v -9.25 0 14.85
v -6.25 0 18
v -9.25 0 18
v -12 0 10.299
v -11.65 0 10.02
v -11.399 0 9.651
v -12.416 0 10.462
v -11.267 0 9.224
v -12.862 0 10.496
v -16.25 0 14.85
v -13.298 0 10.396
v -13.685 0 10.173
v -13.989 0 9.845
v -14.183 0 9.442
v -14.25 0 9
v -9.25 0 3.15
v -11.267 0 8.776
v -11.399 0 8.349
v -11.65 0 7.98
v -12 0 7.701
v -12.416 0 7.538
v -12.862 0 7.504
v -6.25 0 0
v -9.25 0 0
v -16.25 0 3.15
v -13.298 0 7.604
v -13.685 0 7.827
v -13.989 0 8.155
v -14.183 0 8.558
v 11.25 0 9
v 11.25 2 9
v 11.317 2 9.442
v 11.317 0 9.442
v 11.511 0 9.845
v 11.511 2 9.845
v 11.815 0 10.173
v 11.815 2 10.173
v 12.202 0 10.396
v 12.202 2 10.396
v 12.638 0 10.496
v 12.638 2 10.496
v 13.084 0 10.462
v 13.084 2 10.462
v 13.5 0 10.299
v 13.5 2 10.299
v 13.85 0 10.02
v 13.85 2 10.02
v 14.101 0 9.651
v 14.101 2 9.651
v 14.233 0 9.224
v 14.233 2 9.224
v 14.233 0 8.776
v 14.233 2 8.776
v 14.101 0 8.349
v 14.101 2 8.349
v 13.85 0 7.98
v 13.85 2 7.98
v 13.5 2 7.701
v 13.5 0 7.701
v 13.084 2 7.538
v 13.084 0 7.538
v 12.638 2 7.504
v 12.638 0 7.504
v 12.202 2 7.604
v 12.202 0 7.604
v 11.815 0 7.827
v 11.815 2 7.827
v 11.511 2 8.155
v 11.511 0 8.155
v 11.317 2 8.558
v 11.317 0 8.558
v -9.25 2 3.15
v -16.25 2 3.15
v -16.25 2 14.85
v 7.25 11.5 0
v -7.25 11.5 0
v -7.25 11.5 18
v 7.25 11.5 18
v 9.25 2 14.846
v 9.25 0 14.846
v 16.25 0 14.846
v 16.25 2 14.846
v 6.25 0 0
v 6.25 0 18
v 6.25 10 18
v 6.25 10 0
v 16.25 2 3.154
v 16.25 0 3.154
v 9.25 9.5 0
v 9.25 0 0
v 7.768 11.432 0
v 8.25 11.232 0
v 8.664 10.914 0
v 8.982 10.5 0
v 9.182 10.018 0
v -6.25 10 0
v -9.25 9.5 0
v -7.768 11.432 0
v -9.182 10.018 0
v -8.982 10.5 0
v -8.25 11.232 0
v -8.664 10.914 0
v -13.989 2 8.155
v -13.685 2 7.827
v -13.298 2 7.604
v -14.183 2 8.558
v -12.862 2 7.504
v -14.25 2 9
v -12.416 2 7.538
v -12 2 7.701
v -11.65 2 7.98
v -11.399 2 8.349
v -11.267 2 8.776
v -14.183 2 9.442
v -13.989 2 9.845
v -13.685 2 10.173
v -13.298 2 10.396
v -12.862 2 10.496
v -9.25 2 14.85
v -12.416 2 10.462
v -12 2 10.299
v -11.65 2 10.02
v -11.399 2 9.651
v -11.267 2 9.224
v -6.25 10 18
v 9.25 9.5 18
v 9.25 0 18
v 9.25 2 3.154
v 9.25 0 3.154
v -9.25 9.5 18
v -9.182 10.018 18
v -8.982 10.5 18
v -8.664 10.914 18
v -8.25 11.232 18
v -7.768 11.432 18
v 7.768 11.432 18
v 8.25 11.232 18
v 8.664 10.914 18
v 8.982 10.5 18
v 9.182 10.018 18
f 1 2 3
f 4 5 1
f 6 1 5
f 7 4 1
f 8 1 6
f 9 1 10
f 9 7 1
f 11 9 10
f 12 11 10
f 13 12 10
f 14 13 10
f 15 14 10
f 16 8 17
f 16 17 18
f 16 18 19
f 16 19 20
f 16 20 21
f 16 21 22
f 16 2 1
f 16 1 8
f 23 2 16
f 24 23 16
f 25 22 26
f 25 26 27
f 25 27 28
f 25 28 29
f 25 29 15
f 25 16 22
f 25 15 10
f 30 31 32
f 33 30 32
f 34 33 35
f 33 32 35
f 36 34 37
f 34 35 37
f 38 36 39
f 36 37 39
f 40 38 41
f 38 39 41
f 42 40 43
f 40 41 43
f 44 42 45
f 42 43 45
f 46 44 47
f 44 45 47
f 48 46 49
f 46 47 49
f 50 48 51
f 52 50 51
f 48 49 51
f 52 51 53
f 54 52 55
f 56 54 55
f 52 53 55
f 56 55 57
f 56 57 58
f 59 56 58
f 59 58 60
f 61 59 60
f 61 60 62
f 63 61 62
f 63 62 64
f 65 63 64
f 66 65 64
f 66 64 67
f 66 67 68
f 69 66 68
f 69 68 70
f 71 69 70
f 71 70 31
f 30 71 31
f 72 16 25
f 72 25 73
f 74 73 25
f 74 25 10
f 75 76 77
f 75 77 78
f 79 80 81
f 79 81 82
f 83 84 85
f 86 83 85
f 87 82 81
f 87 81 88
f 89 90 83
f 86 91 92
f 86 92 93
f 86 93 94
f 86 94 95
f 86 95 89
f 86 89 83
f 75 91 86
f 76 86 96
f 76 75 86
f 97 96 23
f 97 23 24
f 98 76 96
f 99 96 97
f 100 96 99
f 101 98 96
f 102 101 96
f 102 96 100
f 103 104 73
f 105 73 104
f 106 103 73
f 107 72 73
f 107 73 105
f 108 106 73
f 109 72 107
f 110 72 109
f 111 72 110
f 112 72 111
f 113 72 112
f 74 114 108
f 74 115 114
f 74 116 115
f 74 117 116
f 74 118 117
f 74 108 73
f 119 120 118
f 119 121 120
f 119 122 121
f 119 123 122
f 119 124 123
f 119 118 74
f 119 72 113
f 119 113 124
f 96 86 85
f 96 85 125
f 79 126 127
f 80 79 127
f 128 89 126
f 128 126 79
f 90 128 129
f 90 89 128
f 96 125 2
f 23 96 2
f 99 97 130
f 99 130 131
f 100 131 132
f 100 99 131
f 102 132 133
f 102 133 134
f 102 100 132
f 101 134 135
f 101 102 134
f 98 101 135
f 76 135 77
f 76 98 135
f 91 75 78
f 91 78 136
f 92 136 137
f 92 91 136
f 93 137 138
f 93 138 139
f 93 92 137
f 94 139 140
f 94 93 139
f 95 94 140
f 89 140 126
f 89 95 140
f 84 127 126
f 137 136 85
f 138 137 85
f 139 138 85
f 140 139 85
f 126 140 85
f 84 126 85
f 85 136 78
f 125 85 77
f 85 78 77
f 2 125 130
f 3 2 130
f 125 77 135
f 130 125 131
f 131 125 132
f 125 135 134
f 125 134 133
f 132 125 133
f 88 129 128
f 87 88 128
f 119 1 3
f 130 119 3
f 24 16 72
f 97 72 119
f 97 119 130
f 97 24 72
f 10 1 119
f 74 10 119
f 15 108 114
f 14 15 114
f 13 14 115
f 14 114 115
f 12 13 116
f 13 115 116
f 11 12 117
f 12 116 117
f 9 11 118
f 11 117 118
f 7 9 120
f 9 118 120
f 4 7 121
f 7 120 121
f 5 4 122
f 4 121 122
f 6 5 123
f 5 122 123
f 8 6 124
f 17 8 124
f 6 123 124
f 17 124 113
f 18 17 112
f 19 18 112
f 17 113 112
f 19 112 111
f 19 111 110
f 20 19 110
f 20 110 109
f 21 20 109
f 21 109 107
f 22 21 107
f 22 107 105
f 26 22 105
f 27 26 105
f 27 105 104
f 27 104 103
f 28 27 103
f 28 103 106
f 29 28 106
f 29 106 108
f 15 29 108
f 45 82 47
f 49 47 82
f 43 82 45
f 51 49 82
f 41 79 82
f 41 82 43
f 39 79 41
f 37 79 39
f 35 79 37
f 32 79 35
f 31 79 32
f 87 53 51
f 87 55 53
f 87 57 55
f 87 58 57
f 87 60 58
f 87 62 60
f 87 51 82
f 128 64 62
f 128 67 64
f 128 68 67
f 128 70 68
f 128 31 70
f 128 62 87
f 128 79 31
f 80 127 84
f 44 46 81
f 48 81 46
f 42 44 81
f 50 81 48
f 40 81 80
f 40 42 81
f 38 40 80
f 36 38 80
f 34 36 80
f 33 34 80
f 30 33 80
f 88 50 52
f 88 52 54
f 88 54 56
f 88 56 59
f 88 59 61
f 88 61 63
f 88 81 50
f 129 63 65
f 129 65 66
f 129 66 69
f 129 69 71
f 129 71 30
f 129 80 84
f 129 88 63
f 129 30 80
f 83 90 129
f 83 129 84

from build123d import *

# Parameters (mm, degrees)
BOSS_EXTRUDE1_DEPTH       = 18
SKETCH3_W                 = 11.692277346
SKETCH3_H                 = 2
BOSS_EXTRUDE2_DEPTH       = 7
SKETCH4_W                 = 11.7
SKETCH4_H                 = 2
BOSS_EXTRUDE3_DEPTH       = 7
F_3_0MM_DOWEL_HOLE1_D     = 3
F_3_0MM_DOWEL_HOLE1_DEPTH = 12
F_3_0MM_DOWEL_HOLE1_TIP   = 0.901290929


with BuildPart() as part:
    # Sketch2 → Boss-Extrude1 (new body)
    with BuildSketch(Plane.XY):
        with BuildLine():
            Line((-9.25, 0), (-9.25, 9.5))
            ThreePointArc((-9.25, 9.5), (-8.664213562, 10.914213562), (-7.25, 11.5))
            Line((-7.25, 11.5), (7.25, 11.5))
            ThreePointArc((7.25, 11.5), (8.664213562, 10.914213562), (9.25, 9.5))
            Line((9.25, 9.5), (9.25, 0))
            Line((9.25, 0), (6.25, 0))
            Line((6.25, 0), (6.25, 10))
            Line((6.25, 10), (-6.25, 10))
            Line((-6.25, 10), (-6.25, 0))
            Line((-6.25, 0), (-9.25, 0))
        make_face()
    extrude(amount=BOSS_EXTRUDE1_DEPTH)

    # Sketch3 → Boss-Extrude2 (add)
    with BuildSketch(Plane(origin=(9.25, 0, 0), x_dir=(0, 0, -1), z_dir=(1, 0, 0))):
        with Locations((-9, 1)):
            Rectangle(SKETCH3_W, SKETCH3_H)
    extrude(amount=BOSS_EXTRUDE2_DEPTH)

    # Sketch4 → Boss-Extrude3 (add)
    with BuildSketch(Plane.ZY.offset(9.25)):
        with Locations((9, 1)):
            Rectangle(SKETCH4_W, SKETCH4_H)
    extrude(amount=BOSS_EXTRUDE3_DEPTH)

    # Ø3.0mm Dowel Hole1
    with Locations(Plane.XZ):
        with Locations((12.75, 9), (-12.75, 9)):
            Hole(F_3_0MM_DOWEL_HOLE1_D / 2, depth=F_3_0MM_DOWEL_HOLE1_DEPTH)
            with Locations((0, 0, -(F_3_0MM_DOWEL_HOLE1_DEPTH + F_3_0MM_DOWEL_HOLE1_TIP / 2))):  # 118° drill point
                Cone(0, F_3_0MM_DOWEL_HOLE1_D / 2, F_3_0MM_DOWEL_HOLE1_TIP, mode=Mode.SUBTRACT)


solid = part.part
